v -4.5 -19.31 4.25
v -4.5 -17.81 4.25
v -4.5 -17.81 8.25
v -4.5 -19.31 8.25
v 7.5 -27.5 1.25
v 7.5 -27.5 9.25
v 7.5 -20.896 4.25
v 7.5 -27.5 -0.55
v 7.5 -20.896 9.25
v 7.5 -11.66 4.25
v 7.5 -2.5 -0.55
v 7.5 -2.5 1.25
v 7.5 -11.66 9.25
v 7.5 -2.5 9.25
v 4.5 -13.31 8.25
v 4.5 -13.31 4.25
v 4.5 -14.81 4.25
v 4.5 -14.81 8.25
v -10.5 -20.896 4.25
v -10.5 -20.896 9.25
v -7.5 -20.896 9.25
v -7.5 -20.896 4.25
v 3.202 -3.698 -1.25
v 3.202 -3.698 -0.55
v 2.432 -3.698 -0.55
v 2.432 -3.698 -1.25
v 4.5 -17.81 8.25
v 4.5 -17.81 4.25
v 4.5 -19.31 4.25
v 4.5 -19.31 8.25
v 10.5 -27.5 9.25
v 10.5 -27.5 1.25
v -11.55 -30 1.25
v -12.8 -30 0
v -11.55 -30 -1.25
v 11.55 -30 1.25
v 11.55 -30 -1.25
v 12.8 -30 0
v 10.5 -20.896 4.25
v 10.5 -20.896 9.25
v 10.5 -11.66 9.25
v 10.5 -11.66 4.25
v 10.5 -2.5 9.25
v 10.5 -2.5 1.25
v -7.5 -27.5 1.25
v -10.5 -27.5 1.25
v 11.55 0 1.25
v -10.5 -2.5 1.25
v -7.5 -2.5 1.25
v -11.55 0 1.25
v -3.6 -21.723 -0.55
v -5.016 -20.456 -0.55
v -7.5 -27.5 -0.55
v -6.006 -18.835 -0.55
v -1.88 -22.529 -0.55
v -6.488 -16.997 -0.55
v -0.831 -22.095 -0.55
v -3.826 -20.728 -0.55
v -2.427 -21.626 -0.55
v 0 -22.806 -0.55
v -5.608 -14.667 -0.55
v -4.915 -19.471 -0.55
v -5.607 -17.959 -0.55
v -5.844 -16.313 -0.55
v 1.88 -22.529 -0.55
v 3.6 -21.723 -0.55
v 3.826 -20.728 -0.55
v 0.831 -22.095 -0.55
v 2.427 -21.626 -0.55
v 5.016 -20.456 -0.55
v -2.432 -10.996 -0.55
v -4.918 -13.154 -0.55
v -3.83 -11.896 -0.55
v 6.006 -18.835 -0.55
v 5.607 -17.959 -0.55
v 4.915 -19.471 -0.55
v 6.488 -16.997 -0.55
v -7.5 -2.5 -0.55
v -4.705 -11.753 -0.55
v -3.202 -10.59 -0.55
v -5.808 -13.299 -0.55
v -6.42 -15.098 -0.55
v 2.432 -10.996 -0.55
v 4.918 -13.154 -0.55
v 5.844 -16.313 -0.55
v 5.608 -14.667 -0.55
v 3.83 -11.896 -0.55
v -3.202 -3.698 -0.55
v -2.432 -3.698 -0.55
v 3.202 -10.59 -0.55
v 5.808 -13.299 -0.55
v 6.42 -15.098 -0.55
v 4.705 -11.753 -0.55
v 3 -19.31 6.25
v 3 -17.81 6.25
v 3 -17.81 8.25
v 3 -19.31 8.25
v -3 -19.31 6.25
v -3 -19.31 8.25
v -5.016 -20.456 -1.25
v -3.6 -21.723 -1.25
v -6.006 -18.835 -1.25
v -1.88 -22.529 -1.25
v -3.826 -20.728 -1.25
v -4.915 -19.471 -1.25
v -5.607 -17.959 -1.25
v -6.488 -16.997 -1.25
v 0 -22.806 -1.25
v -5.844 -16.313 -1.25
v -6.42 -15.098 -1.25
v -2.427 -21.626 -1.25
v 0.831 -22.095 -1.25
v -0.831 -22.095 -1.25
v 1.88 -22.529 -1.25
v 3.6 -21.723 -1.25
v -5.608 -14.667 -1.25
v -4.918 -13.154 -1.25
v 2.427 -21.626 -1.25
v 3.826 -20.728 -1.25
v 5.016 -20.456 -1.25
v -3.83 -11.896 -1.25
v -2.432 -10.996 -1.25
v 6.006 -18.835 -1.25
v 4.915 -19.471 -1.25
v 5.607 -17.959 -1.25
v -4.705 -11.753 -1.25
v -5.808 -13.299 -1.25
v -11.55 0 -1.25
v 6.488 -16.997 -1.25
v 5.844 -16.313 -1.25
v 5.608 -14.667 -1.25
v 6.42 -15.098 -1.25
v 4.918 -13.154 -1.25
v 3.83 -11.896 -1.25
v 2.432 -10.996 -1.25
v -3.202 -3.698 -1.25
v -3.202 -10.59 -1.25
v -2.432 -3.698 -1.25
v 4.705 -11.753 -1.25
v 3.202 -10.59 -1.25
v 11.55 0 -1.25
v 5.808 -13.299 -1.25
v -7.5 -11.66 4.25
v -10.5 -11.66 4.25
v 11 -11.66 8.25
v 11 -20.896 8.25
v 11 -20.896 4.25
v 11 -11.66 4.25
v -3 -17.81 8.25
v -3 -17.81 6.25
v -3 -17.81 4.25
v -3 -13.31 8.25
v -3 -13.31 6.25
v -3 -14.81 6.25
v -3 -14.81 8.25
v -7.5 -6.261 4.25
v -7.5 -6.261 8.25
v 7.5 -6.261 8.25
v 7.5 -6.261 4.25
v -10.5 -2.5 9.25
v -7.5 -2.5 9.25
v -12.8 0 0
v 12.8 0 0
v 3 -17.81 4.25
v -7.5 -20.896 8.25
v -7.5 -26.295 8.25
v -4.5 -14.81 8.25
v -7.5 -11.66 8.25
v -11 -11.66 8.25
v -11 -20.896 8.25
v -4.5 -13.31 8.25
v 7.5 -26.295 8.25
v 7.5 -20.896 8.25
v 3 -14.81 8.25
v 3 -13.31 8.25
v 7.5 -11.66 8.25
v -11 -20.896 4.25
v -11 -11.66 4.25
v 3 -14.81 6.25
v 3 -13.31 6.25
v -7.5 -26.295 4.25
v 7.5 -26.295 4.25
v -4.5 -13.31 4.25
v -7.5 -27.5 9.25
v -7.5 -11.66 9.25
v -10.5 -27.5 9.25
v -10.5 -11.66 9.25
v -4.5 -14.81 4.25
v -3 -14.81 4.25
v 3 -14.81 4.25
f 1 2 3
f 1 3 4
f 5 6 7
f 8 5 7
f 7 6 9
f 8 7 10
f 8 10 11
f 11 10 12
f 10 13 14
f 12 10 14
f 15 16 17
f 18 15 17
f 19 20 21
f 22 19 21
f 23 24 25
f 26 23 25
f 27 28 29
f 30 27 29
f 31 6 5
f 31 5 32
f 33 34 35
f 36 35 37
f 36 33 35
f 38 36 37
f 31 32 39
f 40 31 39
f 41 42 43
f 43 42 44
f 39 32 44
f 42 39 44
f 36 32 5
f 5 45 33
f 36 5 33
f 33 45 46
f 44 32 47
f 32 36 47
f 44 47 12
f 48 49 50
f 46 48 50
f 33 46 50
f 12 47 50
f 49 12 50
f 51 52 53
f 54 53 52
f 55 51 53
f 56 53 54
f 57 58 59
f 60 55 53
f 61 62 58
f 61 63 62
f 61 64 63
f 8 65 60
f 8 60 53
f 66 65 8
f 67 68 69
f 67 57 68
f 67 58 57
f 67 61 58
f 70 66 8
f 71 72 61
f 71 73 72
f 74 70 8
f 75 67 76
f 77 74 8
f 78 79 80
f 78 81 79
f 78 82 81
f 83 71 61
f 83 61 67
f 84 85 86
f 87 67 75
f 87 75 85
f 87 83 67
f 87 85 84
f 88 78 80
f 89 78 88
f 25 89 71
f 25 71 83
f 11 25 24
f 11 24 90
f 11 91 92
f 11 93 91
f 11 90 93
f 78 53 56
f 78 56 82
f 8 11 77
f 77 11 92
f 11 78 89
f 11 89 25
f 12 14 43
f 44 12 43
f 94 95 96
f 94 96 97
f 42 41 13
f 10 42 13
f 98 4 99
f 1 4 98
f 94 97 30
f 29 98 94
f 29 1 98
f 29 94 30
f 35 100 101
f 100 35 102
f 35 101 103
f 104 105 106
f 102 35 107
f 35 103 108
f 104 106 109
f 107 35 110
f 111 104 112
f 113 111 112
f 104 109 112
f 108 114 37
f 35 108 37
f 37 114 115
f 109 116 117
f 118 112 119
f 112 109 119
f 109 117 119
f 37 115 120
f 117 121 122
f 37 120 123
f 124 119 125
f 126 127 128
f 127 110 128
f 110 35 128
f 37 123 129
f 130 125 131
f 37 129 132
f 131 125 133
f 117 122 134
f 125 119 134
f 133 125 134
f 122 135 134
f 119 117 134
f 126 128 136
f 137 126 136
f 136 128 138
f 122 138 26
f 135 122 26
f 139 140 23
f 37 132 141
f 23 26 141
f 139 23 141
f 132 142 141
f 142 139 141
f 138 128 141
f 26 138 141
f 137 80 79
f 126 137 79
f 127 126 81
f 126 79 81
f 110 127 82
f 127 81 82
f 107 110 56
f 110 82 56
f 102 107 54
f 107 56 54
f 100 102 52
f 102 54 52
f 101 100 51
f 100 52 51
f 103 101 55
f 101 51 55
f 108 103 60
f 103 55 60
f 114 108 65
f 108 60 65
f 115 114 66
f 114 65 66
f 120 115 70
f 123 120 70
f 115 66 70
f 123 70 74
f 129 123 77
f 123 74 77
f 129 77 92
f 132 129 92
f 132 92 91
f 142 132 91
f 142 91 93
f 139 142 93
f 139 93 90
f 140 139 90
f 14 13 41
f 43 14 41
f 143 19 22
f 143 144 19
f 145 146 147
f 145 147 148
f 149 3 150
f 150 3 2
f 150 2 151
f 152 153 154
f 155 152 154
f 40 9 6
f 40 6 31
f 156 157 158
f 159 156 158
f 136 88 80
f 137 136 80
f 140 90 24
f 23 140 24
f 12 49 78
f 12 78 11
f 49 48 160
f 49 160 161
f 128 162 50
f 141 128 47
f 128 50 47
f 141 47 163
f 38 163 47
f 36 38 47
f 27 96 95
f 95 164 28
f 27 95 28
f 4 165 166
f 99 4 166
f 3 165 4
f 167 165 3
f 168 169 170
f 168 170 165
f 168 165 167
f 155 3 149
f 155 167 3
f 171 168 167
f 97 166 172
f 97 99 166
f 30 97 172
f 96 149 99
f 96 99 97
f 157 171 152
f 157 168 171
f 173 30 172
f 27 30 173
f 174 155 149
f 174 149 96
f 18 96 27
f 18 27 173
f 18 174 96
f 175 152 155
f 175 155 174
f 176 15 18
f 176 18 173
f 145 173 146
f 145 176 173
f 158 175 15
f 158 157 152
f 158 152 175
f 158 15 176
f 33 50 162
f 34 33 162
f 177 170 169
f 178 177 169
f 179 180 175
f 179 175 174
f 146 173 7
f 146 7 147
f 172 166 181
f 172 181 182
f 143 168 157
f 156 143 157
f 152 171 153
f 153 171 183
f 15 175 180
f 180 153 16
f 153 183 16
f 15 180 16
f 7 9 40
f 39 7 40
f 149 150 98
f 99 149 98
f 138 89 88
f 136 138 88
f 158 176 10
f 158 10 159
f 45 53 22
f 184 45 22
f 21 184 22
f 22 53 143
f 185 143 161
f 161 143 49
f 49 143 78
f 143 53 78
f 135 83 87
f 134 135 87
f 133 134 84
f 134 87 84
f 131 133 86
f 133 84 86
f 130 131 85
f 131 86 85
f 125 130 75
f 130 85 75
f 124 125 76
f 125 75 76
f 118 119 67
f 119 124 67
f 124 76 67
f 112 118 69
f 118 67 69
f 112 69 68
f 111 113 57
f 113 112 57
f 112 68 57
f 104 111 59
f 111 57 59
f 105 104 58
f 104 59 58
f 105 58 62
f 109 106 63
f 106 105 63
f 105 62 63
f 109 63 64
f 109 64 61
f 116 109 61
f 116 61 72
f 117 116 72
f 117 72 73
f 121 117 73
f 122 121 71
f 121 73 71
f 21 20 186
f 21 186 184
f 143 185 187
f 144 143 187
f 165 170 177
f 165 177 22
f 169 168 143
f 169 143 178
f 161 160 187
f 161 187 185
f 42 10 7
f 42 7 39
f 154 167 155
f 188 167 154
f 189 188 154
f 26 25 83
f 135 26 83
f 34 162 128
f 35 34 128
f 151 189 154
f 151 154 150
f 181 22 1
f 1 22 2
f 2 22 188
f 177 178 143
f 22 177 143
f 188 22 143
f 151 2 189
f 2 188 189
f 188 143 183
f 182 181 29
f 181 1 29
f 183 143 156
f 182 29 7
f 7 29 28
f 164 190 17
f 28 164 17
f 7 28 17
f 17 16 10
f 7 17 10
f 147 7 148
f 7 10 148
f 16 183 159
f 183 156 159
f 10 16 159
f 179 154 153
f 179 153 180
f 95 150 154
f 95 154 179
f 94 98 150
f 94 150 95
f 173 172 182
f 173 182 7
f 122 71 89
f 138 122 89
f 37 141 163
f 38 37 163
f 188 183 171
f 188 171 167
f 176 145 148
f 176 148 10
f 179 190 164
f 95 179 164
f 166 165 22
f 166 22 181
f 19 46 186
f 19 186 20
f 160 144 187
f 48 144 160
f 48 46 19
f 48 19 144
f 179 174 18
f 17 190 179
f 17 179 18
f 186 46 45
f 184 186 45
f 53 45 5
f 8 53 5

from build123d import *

# Parameters (mm, degrees)
F1_DEPTH  = 30
F2_W      = 15
F2_H      = 25
F3_DEPTH  = 1.8
F5_DEPTH  = 25
F6_W      = 3
F6_H      = 25
F7_DEPTH  = 8
F8_W      = 3.5
F8_H      = 9.235818446
F8_W_2    = 15
F8_H_2    = 5.3992085159
F9_DEPTH  = 5
F10_DEPTH = 5
F11_DEPTH = 1
F12_W     = 1.5
F12_H     = 1.5
F13_DEPTH = 25
F14_W     = 6
F14_H     = 6
F15_DEPTH = 2


with BuildPart() as f1:
    # F0 (on Front) → F1 (new body)
    with BuildSketch(Plane.XZ):
        Polygon((11.55, 1.25), (-11.55, 1.25), (-12.8, 0), (-11.55, -1.25), (11.55, -1.25), (12.8, 0), align=None)
    extrude(amount=F1_DEPTH)

    # F2 (on face) → F3 (cut)
    with BuildSketch(Plane.XY.offset(1.25)):
        with Locations((0, -15)):
            Rectangle(F2_W, F2_H)
    extrude(amount=-F3_DEPTH, mode=Mode.SUBTRACT)

    # F4 (on face) → F5 (cut)
    with BuildSketch(Plane.XY.offset(-0.55)):
        with BuildLine():
            Line((-3.2023354433, -3.6977706477), (-3.2023354433, -10.5899553333))
            ThreePointArc((-3.2023354433, -10.5899553333), (0, -22.8055495128), (3.2023354433, -10.5899553333))
            Line((3.2023354433, -10.5899553333), (3.2023354433, -3.6977706477))
            Line((3.2023354433, -3.6977706477), (2.4318161886, -3.6977706477))
            Line((2.4318161886, -3.6977706477), (2.4318161886, -10.996280238))
            ThreePointArc((2.4318161886, -10.996280238), (0, -22.1541997733), (-2.4318161886, -10.996280238))
            Line((-2.4318161886, -10.996280238), (-2.4318161886, -3.6977706477))
            Line((-2.4318161886, -3.6977706477), (-3.2023354433, -3.6977706477))
        make_face()
    extrude(amount=-F5_DEPTH, mode=Mode.SUBTRACT)

    # F6 (on face) → F7 (join)
    with BuildSketch(Plane.XY.offset(1.25)):
        with Locations((-9, -15)):
            Rectangle(F6_W, F6_H)
        with Locations((9, -15)):
            Rectangle(F6_W, F6_H)
    extrude(amount=F7_DEPTH)

    # F8 (on face) → F9 (cut)
    with BuildSketch(Plane.XY.offset(9.25)):
        with Locations((9.25, -16.2780040203)):
            Rectangle(F8_W, F8_H)
        with Locations((0, -23.5955175012)):
            Rectangle(F8_W_2, F8_H_2)
        with Locations((0, -16.2780040203)):
            Rectangle(F8_W_2, F8_H)
        with Locations((-9.25, -16.2780040203)):
            Rectangle(F8_W, F8_H)
        with Locations((0, -8.9604905394)):
            Rectangle(F8_W_2, F8_H_2)
    extrude(amount=-F9_DEPTH, mode=Mode.SUBTRACT)


with BuildPart() as f10:
    # F8 (on face) → F10 (new body)
    with BuildSketch(Plane.XY.offset(9.25)):
        with Locations((9.25, -16.2780040203)):
            Rectangle(F8_W, F8_H)
        with Locations((0, -23.5955175012)):
            Rectangle(F8_W_2, F8_H_2)
        with Locations((0, -16.2780040203)):
            Rectangle(F8_W_2, F8_H)
        with Locations((-9.25, -16.2780040203)):
            Rectangle(F8_W, F8_H)
        with Locations((0, -8.9604905394)):
            Rectangle(F8_W_2, F8_H_2)
    extrude(amount=-F10_DEPTH)

    # F8 (on face) → F11 (cut)
    with BuildSketch(Plane.XY.offset(9.25)):
        with Locations((9.25, -16.2780040203)):
            Rectangle(F8_W, F8_H)
        with Locations((0, -23.5955175012)):
            Rectangle(F8_W_2, F8_H_2)
        with Locations((0, -16.2780040203)):
            Rectangle(F8_W_2, F8_H)
        with Locations((-9.25, -16.2780040203)):
            Rectangle(F8_W, F8_H)
        with Locations((0, -8.9604905394)):
            Rectangle(F8_W_2, F8_H_2)
    extrude(amount=-F11_DEPTH, mode=Mode.SUBTRACT)

    # F12 (on face) → F13 (cut)
    with BuildSketch(Plane(origin=(0, 0, 4.25), x_dir=(1, 0, 0), z_dir=(0, 0, -1))):
        with Locations((-3.75, 18.5602385438)):
            Rectangle(F12_W, F12_H)
        with Locations((3.75, 18.5602385438)):
            Rectangle(F12_W, F12_H)
        with Locations((3.75, 14.0602385438)):
            Rectangle(F12_W, F12_H)
        with Locations((-3.75, 14.0602385438)):
            Rectangle(F12_W, F12_H)
    extrude(amount=-F13_DEPTH, mode=Mode.SUBTRACT)

    # F14 (on face) → F15 (cut)
    with BuildSketch(Plane(origin=(0, 0, 4.25), x_dir=(1, 0, 0), z_dir=(0, 0, -1))):
        with Locations((0, 16.3102385438)):
            Rectangle(F14_W, F14_H)
    extrude(amount=-F15_DEPTH, mode=Mode.SUBTRACT)


solid = Compound([f1.part, f10.part])
